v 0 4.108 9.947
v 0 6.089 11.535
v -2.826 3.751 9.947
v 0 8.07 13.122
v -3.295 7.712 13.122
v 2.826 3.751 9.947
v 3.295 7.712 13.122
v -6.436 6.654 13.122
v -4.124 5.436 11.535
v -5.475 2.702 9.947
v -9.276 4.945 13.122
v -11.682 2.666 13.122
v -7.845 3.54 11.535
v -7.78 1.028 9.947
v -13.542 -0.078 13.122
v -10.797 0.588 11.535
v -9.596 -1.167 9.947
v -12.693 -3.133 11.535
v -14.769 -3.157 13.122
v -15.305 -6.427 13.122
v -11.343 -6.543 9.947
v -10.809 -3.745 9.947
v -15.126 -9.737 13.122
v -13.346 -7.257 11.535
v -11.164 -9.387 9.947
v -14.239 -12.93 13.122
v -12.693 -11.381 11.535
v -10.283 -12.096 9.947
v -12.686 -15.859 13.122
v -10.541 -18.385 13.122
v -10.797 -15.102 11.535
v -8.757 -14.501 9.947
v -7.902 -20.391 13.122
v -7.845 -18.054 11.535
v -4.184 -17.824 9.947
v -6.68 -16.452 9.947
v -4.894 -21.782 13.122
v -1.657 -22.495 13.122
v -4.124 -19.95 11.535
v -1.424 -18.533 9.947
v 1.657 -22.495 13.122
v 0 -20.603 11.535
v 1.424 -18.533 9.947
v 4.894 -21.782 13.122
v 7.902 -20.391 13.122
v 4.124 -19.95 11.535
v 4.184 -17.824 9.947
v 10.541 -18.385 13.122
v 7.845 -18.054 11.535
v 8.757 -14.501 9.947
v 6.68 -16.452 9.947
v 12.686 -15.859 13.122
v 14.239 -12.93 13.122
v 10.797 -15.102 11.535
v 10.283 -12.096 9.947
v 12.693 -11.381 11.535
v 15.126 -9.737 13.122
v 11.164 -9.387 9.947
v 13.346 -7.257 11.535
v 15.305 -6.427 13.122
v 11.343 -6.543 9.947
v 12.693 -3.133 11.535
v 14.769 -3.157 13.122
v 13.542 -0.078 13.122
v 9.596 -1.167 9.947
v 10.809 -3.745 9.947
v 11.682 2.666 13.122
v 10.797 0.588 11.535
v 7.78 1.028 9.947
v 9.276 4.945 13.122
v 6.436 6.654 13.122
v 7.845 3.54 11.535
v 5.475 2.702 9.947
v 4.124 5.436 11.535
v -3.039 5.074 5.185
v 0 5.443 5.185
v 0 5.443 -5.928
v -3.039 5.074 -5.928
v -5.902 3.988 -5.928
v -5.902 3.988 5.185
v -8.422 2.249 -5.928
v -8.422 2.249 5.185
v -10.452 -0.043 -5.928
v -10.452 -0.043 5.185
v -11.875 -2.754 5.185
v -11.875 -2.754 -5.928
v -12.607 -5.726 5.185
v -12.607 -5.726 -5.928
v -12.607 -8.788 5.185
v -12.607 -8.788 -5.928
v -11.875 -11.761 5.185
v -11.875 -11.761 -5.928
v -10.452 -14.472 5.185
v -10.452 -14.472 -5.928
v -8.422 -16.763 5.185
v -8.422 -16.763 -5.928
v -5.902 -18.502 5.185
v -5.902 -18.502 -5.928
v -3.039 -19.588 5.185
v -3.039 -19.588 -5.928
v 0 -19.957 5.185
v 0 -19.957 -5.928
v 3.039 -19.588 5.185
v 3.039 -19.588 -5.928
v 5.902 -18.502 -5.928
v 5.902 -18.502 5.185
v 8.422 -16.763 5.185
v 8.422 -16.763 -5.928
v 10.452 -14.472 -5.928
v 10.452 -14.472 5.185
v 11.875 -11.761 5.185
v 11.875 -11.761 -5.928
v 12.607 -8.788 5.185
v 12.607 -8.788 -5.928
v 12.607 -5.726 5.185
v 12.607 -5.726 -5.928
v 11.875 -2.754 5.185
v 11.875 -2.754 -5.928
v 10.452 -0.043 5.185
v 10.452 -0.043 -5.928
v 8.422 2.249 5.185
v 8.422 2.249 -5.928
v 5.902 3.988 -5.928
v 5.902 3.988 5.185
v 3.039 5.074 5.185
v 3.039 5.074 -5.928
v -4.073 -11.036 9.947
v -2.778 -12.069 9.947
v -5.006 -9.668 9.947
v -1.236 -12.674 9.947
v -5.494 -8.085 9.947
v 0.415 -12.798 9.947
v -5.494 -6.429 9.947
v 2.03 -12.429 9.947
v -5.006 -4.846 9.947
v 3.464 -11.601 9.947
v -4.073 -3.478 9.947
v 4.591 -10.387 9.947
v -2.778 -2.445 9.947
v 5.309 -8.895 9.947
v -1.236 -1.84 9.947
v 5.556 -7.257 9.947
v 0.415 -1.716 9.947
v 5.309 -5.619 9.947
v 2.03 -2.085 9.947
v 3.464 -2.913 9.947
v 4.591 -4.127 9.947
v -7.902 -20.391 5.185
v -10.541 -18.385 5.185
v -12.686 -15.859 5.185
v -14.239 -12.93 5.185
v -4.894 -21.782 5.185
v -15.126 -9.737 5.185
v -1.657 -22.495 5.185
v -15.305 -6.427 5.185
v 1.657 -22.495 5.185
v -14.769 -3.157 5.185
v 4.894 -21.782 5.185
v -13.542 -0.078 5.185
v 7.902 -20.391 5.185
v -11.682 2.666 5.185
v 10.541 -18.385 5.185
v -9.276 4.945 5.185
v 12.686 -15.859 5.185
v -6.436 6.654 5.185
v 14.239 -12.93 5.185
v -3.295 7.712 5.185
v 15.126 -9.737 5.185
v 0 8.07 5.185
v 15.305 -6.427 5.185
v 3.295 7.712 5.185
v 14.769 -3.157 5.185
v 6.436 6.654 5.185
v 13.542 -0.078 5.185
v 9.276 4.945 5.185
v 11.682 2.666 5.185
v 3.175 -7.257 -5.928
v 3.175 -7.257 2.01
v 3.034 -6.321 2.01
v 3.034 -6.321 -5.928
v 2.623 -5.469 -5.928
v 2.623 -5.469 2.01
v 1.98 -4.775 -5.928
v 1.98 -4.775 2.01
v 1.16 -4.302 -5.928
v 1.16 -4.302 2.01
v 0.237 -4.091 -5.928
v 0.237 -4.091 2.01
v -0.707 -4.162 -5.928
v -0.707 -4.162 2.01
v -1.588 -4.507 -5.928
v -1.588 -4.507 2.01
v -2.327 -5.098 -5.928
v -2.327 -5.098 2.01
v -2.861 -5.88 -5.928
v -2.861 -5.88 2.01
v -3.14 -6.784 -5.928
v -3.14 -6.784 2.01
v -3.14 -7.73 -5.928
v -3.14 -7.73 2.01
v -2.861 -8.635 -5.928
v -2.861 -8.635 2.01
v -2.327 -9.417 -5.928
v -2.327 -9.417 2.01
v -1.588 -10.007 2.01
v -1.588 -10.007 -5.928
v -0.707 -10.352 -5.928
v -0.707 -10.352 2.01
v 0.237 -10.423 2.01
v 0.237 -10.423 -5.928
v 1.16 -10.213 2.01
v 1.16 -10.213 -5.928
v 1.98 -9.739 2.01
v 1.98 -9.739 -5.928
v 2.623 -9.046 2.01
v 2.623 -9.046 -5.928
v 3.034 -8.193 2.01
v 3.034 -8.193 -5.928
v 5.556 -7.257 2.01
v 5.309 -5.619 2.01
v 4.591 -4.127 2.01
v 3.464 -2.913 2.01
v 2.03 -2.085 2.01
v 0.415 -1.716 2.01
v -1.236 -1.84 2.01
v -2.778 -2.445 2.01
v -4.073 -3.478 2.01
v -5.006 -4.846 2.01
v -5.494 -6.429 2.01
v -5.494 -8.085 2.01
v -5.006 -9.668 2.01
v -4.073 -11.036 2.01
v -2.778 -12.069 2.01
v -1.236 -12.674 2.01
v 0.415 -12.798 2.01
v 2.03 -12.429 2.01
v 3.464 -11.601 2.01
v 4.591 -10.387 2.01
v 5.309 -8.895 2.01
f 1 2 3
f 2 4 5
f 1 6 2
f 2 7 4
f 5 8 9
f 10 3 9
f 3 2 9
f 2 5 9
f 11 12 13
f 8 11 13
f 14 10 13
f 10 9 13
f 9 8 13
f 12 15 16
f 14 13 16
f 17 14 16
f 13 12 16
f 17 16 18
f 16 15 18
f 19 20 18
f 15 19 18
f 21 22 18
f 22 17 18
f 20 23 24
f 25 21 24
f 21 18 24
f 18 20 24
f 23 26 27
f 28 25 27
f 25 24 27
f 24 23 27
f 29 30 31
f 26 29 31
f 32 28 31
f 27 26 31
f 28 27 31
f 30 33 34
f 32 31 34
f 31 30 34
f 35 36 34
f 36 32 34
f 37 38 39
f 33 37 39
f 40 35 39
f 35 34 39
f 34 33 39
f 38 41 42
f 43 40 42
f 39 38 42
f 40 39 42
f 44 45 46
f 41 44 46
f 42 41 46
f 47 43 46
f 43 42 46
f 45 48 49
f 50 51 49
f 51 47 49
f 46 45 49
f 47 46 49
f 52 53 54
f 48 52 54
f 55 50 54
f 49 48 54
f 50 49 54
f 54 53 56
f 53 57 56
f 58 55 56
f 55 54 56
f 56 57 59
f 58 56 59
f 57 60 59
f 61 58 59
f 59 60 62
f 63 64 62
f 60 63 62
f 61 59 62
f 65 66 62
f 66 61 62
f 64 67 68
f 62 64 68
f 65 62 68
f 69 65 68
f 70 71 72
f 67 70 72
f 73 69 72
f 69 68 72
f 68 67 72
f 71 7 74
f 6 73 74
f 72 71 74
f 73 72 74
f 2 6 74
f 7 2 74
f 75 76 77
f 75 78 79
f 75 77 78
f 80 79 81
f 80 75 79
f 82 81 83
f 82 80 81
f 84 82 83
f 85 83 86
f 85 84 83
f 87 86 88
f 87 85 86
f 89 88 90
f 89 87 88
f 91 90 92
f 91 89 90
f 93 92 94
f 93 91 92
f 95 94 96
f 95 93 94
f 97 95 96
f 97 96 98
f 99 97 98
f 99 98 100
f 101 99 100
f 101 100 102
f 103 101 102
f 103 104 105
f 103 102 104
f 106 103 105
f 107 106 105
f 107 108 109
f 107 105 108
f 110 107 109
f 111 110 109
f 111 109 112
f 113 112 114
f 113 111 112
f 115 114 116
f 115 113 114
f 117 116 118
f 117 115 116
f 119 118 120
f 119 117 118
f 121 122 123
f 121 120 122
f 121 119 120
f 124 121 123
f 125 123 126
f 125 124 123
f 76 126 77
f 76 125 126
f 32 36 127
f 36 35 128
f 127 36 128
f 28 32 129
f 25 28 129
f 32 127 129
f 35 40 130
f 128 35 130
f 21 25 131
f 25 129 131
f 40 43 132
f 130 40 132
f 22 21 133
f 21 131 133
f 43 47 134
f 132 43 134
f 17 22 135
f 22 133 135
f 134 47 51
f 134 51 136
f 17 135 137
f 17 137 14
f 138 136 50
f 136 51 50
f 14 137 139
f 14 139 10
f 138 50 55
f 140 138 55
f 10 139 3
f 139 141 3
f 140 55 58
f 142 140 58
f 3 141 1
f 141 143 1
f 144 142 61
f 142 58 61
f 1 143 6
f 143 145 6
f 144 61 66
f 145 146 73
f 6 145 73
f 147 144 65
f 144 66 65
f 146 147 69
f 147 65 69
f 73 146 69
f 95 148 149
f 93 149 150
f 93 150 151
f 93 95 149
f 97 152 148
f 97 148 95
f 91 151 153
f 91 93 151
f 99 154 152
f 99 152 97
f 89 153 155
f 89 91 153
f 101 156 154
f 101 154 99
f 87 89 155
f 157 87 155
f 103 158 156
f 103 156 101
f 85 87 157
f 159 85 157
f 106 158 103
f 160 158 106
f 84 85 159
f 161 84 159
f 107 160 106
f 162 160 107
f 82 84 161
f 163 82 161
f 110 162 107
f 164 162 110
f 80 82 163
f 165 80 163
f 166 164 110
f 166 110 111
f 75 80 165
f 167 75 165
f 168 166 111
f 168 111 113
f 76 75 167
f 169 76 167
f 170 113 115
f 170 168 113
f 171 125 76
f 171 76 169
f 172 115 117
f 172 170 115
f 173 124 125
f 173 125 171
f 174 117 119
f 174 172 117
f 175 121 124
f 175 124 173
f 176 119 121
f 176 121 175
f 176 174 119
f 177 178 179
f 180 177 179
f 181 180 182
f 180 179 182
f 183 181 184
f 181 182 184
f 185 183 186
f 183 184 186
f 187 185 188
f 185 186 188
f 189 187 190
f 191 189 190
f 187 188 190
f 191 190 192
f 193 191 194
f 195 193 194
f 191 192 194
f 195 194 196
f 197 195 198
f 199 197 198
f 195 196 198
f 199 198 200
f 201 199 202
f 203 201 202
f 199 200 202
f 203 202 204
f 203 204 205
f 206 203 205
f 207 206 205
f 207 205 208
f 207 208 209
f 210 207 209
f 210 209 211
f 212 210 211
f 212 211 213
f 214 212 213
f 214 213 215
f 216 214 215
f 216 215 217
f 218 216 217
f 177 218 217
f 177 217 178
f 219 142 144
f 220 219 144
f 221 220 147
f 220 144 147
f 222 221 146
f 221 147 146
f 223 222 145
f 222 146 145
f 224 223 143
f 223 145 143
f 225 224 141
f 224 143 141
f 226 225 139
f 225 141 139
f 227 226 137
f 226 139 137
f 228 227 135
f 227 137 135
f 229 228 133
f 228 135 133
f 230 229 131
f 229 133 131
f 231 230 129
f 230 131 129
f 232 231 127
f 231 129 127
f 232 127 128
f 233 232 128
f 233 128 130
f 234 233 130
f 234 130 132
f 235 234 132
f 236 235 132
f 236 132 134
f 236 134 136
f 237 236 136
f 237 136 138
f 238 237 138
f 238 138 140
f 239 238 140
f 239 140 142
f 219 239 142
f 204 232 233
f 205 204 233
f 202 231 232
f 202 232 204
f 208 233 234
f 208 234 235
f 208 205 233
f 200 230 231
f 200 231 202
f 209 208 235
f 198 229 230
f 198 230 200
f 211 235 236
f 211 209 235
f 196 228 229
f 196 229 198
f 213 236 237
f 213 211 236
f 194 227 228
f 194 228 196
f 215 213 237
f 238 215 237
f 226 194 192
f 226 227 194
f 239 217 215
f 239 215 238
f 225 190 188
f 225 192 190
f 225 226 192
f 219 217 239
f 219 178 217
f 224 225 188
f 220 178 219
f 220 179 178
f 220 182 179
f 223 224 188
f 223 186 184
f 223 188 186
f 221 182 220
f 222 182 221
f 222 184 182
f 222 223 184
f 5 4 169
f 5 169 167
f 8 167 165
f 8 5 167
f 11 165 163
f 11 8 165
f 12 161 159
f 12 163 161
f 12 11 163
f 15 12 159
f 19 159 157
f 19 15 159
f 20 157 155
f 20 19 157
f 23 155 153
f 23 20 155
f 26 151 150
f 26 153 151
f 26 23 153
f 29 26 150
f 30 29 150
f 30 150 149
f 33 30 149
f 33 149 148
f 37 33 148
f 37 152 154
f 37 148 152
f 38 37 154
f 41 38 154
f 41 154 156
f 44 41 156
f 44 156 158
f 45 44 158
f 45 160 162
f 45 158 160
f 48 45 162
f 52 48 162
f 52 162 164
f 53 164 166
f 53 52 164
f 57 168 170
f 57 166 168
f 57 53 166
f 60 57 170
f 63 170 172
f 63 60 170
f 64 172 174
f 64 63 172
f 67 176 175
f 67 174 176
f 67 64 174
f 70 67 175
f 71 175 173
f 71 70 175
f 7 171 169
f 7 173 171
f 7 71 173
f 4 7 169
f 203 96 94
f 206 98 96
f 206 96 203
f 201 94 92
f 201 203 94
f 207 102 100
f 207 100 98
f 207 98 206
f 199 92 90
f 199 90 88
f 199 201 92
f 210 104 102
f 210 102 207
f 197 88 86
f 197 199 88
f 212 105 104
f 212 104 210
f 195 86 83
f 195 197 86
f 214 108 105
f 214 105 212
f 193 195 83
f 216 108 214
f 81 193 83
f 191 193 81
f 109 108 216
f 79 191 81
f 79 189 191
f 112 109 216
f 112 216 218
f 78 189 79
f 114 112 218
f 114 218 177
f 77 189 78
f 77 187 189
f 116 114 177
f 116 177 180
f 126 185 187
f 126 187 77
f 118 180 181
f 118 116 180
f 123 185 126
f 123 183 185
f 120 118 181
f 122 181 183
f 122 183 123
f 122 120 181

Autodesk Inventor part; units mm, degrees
ref_plane "YZ Plane" through (0, 0, 0) normal (1, 0, 0) x (0, 1, 0)
ref_plane "XZ Plane" through (0, 0, 0) normal (0, 1, 0) x (-1, 0, 0)
ref_plane "XY Plane" through (0, 0, 0) normal (0, 0, 1) x (1, 0, 0)
sketch "Sketch1" plane through (0, 0, 0) normal (1, 0, 0) x (0, 1, 0)
  line L0 (4.108, 9.9473) -> (-5.9746, 9.9473)
  line L1 (-5.9746, 9.9473) -> (-5.9746, 1.0479)
  line L2 (-5.9746, 1.0479) -> (-7.2571, 1.0479)
  line L3 (-7.2571, 1.0479) -> (-7.2571, -5.9277)
  line L4 (-7.2571, -5.9277) -> (5.4429, -5.9277)
  line L5 (5.4429, -5.9277) -> (5.4429, 5.1848)
  line L6 (5.4429, 5.1848) -> (8.0704, 5.1848)
  line L7 (8.0704, 5.1848) -> (8.0704, 13.1223)
  line L8 (4.108, 9.9473) -> (8.0704, 13.1223)
  line L9 (5.4429, -5.9277) -> (-46.9446, -5.9277) construction
  line L10 (-46.9446, -5.9277) -> (-46.9446, 28.5001)
  point P0 (0, 0)
  dimension "d3" = 19.05
  dimension "d4" = 7.9375
  dimension "d5" = 3.175
  dimension "d6" = 3.9624
  dimension "d7" = 12.7
  dimension "d20" = 52.3875
revolve "Revolution1" add sketch "Sketch1" angle 360 about axis through (0, -7.2571, 1.0479) along (0, 0, -1)
sketch "Sketch2" plane through (0, -7.2571, 9.9473) normal (0, 0, 1) x (1, 0, 0)
  circle A0 centre (0, 0) radius 1.2825 projected
  circle A1 centre (0, 0) radius 5.5563
  point P0 (0, 7.2571)
  dimension "d9" = 11.1125
extrude "Extrusion1" cut sketch "Sketch2" against normal blind 7.9375
sketch "Sketch5" plane through (0, -7.2571, 2.0098) normal (0, 0, 1) x (1, 0, 0)
  circle A0 centre (0, 0) radius 3.175
  point P0 (0, 7.2571)
  dimension "d17" = 6.35
extrude "Extrusion4" cut sketch "Sketch5" against normal blind 211.1375
